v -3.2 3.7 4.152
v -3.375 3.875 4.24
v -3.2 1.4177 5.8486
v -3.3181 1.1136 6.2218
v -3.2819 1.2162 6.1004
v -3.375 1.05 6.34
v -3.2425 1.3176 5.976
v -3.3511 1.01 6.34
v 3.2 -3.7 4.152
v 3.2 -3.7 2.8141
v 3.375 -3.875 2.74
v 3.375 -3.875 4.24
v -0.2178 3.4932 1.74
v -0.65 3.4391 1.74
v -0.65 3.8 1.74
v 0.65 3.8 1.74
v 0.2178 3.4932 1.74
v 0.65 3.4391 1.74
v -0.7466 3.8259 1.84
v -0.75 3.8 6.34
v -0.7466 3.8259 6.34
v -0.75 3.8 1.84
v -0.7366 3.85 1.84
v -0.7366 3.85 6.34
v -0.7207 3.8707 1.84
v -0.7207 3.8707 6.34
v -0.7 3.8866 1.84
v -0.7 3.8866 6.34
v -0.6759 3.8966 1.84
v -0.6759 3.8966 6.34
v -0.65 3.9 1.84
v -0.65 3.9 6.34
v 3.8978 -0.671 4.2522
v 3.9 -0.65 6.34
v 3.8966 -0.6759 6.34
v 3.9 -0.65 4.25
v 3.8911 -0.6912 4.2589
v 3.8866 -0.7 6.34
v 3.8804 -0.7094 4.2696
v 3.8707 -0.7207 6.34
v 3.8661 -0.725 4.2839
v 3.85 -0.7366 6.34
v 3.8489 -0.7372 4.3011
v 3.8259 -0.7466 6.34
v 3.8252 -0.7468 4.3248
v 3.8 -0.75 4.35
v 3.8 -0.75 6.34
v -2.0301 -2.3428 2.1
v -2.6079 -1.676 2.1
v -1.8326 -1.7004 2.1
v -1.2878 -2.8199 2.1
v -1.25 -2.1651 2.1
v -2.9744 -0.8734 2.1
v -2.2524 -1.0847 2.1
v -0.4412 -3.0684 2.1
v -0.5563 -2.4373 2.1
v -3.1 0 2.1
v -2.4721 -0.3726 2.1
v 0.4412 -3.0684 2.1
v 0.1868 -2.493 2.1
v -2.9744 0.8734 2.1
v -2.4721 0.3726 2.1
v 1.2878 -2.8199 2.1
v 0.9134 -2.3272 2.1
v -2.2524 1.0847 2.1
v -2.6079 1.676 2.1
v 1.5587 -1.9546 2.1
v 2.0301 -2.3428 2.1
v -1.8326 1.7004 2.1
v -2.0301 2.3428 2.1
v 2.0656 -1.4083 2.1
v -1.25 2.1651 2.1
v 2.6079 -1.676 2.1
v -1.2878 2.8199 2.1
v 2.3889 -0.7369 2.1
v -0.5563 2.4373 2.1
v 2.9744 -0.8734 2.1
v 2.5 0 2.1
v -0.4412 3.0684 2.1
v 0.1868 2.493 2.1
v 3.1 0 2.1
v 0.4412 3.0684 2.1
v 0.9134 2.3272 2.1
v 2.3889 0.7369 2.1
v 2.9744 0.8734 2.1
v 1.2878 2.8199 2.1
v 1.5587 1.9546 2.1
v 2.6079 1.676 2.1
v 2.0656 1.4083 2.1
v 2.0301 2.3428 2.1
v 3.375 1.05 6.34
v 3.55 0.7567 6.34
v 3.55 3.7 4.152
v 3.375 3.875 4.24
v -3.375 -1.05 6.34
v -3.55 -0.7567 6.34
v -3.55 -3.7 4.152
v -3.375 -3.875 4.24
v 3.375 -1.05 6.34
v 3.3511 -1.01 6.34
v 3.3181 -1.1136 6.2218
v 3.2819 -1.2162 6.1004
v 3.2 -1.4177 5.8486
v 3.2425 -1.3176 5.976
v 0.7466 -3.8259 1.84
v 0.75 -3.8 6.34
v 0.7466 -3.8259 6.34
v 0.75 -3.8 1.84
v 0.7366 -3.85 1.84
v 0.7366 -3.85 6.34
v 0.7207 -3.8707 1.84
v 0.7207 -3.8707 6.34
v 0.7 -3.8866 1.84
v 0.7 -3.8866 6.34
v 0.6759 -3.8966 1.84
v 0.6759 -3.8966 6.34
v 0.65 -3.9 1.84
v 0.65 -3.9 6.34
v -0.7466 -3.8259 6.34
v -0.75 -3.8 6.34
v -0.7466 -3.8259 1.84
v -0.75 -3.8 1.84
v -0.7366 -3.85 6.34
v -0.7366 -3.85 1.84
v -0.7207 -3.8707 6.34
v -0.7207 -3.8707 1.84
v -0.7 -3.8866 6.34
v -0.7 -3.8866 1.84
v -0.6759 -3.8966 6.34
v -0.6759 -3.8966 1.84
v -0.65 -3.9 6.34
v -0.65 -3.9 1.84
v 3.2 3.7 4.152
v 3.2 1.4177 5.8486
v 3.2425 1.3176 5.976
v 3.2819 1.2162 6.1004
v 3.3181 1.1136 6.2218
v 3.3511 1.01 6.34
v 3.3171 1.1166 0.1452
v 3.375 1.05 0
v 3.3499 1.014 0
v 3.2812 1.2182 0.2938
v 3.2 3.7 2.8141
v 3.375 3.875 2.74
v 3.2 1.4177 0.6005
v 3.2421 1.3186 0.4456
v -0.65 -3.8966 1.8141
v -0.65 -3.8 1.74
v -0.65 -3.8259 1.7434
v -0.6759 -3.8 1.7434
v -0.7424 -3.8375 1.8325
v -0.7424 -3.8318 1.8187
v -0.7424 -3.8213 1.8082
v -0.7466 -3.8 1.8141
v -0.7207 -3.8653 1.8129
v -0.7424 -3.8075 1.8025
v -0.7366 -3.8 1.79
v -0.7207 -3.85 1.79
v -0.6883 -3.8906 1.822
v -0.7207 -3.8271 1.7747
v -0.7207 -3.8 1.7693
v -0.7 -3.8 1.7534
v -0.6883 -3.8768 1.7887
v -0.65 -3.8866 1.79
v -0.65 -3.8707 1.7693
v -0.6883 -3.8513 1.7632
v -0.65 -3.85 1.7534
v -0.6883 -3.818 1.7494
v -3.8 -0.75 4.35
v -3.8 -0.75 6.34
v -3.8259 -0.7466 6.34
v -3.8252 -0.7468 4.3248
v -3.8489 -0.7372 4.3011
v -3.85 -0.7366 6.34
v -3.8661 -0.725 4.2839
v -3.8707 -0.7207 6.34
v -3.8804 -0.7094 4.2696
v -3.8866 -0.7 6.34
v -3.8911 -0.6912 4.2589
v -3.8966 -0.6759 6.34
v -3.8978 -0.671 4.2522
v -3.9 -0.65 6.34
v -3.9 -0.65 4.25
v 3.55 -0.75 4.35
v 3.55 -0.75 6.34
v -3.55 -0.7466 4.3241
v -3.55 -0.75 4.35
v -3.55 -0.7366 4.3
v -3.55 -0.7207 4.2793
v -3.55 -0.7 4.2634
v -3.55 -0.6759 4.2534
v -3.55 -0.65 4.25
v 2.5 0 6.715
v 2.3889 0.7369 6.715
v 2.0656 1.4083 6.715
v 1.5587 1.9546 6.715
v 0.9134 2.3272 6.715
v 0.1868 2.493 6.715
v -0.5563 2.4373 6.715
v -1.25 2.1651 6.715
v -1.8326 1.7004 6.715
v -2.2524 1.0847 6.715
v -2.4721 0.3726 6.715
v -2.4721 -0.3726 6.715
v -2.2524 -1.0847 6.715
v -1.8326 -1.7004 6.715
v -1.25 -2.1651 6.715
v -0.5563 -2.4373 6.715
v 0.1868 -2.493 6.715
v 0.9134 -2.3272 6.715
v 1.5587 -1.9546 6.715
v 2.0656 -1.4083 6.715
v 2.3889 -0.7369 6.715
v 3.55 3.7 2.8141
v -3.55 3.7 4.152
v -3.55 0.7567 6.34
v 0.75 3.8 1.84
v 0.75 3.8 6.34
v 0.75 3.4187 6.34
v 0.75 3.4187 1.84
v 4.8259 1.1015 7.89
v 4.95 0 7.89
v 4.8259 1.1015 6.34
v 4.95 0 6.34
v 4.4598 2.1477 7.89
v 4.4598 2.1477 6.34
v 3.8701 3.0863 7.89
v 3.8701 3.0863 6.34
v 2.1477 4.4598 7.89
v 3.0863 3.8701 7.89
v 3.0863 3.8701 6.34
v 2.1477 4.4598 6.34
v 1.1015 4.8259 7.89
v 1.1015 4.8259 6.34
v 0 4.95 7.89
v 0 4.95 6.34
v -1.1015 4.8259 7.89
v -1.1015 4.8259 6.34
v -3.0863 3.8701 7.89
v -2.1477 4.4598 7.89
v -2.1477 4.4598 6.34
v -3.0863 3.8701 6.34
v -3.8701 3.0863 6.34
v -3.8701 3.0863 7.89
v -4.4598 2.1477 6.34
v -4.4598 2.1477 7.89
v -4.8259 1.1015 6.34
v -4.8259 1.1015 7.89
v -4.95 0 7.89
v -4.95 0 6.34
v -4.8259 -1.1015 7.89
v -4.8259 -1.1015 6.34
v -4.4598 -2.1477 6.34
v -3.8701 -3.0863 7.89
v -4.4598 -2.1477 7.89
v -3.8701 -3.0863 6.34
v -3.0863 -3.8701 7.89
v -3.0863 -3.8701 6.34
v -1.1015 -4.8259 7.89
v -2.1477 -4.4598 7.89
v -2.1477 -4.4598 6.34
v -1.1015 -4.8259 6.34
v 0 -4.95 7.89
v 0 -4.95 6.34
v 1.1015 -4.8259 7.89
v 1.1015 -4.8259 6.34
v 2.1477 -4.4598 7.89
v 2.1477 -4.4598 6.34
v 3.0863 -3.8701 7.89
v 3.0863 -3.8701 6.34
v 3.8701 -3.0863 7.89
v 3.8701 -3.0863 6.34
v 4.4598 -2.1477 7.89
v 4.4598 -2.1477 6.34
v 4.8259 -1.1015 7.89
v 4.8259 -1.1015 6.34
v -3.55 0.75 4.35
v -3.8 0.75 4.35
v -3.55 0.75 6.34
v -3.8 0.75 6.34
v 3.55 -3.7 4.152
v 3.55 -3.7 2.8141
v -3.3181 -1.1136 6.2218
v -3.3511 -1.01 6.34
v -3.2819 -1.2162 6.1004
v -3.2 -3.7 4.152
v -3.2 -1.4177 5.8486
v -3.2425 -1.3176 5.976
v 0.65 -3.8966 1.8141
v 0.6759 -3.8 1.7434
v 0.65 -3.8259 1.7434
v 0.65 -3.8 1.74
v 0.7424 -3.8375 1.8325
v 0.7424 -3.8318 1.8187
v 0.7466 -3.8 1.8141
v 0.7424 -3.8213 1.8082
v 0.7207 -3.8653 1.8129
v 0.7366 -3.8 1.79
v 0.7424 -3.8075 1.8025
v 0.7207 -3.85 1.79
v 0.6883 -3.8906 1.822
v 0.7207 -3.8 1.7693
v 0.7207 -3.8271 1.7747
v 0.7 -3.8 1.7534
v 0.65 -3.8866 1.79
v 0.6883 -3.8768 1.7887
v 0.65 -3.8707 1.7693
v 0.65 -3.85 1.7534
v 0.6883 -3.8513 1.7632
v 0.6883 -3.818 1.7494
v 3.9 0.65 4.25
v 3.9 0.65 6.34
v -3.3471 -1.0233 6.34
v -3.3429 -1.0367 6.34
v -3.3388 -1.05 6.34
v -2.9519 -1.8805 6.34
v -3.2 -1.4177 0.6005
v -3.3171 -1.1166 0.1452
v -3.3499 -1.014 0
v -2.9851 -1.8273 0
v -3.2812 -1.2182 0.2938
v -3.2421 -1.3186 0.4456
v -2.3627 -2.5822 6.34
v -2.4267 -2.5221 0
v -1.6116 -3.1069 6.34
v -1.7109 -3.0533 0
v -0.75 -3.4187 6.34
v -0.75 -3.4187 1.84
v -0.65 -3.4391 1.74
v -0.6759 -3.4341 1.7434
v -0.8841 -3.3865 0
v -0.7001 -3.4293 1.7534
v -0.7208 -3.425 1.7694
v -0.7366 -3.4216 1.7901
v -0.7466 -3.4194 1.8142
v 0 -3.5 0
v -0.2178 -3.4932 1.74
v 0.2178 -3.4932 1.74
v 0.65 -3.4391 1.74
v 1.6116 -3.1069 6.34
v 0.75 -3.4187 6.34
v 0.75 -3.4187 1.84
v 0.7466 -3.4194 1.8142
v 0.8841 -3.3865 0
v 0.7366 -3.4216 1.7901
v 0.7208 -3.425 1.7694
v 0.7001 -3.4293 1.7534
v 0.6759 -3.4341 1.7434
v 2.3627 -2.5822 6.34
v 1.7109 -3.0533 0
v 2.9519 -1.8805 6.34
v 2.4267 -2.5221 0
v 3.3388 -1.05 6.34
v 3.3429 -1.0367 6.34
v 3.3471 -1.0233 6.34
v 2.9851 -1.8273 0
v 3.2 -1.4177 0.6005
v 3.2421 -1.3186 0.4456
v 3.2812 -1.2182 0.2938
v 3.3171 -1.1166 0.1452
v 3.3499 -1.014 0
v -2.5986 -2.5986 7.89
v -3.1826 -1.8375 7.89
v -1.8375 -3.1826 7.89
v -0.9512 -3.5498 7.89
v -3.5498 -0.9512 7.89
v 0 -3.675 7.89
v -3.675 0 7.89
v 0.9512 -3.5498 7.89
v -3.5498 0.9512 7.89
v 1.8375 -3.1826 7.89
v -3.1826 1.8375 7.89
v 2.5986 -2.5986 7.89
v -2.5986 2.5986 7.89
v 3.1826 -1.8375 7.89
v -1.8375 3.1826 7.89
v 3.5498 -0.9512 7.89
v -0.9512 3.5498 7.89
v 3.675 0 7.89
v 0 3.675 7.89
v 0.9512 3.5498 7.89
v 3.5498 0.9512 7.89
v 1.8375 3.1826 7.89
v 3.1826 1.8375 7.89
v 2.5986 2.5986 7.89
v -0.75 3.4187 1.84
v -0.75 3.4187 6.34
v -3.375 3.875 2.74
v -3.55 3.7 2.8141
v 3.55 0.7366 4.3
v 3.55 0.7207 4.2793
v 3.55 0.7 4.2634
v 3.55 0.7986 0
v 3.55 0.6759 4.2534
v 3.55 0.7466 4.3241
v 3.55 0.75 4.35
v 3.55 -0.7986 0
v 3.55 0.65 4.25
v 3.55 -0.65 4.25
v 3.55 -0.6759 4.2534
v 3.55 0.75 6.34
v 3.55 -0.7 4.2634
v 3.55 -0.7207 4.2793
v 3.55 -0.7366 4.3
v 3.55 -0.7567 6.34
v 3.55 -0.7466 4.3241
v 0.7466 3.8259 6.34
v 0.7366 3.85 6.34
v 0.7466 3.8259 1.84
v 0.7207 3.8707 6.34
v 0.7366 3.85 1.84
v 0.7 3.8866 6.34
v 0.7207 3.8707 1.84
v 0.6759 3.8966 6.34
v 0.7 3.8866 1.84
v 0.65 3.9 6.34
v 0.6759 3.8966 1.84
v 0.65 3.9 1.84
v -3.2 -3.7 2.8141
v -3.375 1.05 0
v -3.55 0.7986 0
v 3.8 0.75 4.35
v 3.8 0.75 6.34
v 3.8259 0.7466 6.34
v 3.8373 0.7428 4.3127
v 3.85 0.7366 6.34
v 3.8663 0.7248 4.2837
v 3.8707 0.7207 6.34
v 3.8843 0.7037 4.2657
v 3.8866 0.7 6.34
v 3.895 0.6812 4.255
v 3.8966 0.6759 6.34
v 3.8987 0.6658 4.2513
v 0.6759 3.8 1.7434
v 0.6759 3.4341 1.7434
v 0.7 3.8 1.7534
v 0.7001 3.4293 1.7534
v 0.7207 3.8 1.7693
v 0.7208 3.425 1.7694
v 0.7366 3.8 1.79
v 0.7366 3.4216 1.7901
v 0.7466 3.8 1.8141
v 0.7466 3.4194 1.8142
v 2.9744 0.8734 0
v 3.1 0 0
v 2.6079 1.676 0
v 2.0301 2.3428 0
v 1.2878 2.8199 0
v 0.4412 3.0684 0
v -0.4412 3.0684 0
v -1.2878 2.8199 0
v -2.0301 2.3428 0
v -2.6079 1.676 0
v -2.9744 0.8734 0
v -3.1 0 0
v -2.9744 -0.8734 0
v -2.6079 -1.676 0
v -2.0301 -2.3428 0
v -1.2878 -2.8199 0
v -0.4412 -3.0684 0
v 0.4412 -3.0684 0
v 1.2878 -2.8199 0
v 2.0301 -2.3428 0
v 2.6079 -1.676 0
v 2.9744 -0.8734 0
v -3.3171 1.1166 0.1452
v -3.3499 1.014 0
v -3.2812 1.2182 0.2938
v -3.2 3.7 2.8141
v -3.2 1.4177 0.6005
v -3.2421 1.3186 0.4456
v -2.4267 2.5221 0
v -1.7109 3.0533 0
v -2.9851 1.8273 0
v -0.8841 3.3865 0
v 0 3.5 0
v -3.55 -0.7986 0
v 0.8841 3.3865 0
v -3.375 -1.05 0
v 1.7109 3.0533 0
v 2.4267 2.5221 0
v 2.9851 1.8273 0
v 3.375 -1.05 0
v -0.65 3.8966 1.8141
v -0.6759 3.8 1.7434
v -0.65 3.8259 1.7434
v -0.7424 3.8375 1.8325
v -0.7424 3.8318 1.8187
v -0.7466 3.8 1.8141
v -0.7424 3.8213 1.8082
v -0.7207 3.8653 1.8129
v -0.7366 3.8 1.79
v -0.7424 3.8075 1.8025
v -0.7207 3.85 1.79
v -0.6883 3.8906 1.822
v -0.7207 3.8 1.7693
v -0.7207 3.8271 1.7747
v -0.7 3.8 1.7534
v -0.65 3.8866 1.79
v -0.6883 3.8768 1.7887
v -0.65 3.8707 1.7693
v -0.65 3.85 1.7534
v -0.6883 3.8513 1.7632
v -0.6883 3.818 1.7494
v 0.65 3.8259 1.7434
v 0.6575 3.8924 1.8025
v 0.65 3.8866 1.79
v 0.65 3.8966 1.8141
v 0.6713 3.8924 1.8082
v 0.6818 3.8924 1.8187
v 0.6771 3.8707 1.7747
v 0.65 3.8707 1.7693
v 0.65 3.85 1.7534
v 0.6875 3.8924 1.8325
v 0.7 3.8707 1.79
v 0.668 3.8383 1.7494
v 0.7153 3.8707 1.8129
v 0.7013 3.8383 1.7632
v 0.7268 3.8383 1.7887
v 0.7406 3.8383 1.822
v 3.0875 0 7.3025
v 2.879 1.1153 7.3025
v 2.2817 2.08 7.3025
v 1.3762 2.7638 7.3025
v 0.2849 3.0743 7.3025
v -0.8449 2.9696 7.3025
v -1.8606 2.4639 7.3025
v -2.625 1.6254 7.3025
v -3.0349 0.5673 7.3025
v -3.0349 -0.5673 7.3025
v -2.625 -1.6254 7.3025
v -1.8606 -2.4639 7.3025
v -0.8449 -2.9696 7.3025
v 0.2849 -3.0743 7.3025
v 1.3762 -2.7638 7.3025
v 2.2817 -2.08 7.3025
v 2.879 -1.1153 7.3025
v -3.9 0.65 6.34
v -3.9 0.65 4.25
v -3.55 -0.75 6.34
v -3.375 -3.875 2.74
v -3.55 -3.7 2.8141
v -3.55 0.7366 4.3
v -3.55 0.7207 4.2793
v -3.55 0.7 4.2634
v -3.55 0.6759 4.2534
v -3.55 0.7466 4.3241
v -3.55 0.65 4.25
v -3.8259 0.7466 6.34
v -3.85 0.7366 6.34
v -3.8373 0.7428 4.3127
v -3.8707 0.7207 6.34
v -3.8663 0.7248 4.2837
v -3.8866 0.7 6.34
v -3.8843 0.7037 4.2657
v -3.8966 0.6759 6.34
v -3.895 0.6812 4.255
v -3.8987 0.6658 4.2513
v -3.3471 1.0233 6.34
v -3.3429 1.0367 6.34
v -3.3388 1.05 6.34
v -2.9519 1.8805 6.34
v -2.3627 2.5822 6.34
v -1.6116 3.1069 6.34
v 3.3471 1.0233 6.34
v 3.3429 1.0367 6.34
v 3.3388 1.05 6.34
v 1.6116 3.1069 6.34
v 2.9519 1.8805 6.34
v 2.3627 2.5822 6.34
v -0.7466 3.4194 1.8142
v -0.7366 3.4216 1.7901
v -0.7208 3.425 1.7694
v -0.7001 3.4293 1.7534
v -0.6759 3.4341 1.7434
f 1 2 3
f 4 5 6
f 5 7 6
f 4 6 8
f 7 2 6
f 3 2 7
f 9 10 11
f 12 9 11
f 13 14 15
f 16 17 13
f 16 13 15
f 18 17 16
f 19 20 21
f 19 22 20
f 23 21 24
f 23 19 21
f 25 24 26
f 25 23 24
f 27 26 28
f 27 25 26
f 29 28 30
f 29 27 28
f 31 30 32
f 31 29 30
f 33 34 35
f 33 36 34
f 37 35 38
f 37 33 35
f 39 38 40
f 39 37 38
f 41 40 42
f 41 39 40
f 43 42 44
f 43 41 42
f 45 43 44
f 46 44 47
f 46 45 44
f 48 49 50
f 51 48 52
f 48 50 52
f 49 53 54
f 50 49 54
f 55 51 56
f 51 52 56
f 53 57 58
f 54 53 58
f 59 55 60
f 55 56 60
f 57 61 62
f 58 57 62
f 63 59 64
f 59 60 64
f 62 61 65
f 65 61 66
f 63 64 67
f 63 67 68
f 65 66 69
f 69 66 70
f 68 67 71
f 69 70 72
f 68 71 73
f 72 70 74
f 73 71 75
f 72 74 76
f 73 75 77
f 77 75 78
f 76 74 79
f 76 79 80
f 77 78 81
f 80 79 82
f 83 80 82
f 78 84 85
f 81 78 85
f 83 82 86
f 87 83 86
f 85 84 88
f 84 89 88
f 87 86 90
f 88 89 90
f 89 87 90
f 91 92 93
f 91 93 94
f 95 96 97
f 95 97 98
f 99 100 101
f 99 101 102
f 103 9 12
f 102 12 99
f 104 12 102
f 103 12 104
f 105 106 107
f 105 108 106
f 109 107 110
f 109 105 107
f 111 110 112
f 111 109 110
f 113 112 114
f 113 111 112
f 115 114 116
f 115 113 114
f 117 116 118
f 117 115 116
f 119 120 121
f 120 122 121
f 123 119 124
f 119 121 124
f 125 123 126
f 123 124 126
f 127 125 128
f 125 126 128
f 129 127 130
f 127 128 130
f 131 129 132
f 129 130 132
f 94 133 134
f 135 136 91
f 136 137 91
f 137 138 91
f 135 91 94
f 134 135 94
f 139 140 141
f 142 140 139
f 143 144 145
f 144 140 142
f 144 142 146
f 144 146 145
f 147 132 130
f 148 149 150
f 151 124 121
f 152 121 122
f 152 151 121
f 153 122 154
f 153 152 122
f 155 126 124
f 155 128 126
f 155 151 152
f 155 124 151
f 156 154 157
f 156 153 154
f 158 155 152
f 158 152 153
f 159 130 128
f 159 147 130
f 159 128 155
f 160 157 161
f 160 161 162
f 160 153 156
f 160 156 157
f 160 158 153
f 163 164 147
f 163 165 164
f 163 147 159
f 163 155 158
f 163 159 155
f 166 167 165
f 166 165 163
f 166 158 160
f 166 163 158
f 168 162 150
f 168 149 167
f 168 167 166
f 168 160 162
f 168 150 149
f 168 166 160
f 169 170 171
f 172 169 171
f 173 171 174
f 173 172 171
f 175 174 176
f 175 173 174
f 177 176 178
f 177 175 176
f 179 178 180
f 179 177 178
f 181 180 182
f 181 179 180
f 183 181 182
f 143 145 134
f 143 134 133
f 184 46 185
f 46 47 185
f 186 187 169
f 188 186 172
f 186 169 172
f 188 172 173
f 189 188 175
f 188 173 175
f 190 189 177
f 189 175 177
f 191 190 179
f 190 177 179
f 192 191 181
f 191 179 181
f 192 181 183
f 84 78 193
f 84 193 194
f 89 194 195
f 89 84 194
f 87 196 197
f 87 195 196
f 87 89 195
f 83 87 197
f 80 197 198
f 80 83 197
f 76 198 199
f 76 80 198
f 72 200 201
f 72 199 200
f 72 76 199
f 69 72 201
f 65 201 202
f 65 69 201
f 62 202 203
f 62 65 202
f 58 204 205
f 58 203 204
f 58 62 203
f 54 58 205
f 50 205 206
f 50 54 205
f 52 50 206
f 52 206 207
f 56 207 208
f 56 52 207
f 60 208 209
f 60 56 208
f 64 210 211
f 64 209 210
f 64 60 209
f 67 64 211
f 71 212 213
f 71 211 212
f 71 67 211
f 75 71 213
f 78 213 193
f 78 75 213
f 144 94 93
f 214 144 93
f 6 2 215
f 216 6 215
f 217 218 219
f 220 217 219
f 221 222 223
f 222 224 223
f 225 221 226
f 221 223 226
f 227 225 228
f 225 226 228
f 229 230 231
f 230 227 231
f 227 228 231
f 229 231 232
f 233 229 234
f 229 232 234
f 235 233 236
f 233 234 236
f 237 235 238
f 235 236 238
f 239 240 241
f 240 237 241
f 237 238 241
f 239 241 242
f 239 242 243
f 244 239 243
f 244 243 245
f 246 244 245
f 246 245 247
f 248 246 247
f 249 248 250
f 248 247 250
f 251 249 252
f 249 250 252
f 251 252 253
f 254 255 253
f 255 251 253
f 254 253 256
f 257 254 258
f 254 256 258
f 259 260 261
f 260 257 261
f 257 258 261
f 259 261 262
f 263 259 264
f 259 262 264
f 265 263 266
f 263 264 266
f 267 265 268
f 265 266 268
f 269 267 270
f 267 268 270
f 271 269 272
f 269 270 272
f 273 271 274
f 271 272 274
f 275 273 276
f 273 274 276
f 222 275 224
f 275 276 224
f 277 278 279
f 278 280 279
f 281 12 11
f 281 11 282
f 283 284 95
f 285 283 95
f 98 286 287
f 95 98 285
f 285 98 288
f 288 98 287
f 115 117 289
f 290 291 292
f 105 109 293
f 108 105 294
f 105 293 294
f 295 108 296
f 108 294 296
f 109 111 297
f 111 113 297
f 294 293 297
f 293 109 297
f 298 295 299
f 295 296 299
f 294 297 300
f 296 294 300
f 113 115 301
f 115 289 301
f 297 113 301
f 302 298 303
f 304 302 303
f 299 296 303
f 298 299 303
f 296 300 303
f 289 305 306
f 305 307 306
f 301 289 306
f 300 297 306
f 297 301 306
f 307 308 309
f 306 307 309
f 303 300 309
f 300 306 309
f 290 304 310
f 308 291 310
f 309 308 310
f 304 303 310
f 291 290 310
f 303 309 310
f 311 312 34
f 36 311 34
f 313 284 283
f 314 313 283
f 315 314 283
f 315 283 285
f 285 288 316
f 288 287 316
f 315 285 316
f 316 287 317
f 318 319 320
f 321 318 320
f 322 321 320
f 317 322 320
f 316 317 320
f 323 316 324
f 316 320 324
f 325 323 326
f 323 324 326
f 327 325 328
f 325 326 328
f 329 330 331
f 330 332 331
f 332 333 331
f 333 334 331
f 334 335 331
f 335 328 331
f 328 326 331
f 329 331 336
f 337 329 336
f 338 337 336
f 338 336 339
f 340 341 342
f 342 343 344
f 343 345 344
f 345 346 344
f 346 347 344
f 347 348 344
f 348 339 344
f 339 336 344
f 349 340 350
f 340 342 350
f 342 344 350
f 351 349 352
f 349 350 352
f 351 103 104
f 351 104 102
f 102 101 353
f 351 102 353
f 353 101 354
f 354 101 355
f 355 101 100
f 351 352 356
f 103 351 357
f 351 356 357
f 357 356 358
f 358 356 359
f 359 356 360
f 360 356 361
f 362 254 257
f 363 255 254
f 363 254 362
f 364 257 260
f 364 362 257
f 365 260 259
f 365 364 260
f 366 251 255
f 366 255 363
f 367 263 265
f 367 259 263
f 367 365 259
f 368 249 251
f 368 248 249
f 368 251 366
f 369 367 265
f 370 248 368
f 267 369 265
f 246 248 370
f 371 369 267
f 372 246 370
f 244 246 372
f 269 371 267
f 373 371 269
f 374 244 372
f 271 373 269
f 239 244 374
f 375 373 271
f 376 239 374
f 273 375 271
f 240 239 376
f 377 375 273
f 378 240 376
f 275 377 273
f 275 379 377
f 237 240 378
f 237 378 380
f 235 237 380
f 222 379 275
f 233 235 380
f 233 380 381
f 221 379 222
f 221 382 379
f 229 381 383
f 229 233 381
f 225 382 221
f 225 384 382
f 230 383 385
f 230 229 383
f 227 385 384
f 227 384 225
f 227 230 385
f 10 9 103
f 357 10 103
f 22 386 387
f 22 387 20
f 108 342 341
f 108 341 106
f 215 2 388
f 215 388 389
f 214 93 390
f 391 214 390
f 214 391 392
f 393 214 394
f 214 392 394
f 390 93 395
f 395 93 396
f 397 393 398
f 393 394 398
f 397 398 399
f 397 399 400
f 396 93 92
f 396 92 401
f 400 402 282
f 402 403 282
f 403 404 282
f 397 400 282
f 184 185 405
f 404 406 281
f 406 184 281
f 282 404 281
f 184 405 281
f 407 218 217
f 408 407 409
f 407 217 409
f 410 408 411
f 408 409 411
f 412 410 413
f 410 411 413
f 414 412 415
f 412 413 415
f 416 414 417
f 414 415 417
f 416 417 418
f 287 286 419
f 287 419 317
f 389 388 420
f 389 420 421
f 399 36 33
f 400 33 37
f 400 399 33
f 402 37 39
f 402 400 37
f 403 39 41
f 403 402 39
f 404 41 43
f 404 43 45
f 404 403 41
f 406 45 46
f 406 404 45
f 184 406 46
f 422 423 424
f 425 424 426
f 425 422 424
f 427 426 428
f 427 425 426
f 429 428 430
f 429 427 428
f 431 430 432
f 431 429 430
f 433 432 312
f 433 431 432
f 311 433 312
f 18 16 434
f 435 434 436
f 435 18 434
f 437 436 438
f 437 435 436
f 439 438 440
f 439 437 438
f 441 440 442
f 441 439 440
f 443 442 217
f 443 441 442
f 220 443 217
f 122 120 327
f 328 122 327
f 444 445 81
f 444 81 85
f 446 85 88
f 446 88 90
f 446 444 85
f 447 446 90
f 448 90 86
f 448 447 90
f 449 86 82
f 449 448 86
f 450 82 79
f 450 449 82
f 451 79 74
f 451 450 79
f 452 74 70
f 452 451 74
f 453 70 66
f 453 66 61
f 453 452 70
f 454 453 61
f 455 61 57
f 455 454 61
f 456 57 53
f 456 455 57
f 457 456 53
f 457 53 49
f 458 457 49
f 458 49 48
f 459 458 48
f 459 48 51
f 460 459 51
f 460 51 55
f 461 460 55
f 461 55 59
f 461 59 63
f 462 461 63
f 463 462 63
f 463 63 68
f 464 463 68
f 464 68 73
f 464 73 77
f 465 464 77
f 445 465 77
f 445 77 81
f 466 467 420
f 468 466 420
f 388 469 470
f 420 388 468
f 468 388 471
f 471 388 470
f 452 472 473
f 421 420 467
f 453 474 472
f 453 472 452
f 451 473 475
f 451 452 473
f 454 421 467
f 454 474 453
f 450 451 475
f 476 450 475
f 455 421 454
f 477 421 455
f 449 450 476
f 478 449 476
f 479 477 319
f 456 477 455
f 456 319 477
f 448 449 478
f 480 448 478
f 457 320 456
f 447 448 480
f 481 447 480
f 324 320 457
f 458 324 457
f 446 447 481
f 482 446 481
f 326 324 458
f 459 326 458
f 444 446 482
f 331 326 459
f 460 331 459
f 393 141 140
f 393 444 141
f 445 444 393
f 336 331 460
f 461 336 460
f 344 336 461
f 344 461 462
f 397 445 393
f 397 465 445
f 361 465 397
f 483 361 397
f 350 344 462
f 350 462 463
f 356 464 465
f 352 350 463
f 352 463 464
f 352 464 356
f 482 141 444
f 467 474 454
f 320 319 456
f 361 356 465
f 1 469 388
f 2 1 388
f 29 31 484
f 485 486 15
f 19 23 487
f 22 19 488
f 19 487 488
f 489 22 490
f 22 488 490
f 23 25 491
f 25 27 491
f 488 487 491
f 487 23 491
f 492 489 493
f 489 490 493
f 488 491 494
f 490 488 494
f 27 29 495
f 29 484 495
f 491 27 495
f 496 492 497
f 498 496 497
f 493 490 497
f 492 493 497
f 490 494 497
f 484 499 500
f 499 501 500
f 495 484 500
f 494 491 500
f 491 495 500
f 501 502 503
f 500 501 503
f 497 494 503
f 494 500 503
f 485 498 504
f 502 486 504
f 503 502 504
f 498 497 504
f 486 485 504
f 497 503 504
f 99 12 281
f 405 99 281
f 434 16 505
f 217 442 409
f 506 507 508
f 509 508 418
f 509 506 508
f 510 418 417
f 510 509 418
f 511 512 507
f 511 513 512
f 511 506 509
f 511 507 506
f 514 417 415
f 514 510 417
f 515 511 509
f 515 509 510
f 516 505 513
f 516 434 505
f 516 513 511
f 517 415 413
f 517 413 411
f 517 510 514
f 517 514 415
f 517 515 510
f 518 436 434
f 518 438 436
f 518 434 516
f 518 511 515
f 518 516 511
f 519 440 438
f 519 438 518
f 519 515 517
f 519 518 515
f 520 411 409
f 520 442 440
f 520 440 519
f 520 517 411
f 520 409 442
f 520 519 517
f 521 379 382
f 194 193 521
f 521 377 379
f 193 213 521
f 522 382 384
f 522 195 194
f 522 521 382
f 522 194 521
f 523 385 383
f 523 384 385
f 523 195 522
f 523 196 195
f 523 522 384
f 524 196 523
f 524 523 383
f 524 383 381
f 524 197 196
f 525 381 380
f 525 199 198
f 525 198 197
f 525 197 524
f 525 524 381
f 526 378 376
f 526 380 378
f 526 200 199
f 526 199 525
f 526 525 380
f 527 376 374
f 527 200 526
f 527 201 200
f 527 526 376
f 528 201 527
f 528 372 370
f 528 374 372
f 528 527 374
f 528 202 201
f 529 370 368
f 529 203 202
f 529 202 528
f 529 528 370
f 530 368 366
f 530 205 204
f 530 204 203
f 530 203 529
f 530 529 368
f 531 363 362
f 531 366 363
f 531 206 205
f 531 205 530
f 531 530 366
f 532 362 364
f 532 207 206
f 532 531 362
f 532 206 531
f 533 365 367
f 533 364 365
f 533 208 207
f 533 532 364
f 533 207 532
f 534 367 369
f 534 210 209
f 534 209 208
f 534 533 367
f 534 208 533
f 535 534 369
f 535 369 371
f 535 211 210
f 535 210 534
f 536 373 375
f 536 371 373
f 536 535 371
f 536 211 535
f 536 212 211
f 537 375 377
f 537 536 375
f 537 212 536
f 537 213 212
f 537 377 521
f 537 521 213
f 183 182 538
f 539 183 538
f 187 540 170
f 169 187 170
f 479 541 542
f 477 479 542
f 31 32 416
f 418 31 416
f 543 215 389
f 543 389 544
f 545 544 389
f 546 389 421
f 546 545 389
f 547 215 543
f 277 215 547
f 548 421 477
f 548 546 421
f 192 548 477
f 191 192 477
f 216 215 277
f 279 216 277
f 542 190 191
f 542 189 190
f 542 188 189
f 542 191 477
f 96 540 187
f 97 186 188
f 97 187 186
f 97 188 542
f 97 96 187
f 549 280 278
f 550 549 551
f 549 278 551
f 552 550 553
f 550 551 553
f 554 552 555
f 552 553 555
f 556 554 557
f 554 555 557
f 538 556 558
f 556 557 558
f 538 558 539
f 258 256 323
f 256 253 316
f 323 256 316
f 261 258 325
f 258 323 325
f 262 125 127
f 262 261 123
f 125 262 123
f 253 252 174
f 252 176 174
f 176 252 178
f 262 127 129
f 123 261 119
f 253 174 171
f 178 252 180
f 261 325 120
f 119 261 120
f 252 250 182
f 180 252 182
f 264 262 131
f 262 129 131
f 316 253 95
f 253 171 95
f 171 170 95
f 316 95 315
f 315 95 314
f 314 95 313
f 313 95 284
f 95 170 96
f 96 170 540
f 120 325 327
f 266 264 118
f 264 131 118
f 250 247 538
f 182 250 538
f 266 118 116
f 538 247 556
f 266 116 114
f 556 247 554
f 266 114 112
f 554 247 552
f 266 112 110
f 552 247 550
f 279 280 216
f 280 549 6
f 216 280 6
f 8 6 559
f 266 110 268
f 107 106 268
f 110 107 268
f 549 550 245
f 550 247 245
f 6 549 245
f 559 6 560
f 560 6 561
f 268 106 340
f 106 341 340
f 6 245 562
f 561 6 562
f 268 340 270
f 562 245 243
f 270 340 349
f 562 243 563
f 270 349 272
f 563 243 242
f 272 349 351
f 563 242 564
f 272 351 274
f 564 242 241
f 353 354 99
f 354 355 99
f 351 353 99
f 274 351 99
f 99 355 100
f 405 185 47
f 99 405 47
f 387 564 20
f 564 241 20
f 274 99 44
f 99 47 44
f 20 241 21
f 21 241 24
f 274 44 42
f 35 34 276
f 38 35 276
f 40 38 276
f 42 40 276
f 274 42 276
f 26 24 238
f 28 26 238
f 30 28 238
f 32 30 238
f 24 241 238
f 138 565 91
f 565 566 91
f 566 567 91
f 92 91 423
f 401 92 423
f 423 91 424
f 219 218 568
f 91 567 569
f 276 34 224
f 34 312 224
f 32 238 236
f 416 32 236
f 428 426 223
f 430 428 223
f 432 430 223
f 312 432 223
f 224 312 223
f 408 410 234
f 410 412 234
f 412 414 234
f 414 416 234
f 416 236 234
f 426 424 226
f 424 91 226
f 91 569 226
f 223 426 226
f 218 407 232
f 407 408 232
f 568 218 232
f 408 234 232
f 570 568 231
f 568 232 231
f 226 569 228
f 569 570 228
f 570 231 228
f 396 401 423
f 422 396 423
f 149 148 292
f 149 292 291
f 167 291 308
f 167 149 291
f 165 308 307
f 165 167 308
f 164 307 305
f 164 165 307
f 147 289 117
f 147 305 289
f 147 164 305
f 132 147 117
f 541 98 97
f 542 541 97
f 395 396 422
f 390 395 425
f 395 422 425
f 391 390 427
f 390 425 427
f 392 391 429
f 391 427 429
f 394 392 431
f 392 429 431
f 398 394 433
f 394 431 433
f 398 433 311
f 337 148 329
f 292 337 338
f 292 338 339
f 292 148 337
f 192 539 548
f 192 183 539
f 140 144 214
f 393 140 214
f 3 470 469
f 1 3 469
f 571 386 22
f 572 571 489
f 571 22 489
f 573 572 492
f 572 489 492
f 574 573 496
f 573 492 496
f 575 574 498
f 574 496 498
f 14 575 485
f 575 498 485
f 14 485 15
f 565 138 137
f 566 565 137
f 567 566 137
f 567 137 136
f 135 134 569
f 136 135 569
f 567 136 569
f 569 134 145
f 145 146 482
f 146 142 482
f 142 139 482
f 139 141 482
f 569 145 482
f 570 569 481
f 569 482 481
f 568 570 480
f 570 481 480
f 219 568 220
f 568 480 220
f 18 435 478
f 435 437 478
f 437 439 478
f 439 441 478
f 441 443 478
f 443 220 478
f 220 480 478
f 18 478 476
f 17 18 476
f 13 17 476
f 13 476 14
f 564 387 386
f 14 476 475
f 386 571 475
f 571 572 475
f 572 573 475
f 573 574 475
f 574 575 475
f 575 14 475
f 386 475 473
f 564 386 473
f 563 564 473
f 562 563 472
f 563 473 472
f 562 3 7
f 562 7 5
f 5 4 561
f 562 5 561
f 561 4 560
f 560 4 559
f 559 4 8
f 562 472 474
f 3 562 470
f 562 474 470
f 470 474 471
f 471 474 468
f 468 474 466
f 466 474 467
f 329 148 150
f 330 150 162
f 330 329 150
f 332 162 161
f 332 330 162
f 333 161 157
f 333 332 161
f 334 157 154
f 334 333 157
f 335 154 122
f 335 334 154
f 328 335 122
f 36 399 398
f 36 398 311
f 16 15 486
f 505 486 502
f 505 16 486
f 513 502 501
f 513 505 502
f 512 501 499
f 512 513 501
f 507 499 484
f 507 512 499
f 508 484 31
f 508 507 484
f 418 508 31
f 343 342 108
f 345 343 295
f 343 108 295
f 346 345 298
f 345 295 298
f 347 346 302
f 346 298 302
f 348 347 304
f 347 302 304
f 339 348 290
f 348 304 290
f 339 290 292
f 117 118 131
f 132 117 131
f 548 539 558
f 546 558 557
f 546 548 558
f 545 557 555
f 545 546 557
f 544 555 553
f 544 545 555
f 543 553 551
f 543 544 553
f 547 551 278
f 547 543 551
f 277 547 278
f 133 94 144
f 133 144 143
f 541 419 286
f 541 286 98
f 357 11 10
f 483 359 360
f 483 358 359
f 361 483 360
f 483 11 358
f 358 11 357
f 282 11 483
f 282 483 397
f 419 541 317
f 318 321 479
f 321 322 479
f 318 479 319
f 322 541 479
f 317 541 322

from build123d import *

# Parameters (mm, degrees)
F0_R          = 3.5
F0_R_2        = 3.1
F1_DEPTH      = 2.1
F2_R          = 3.5
F2_R_2        = 3.1
F2_R_3        = 2.5
F3_DEPTH      = 4.24
F4_R          = 4.95
F4_R_2        = 3.5
F4_R_3        = 2.5
F5_DEPTH      = 1.55
F6_SIZE       = 1.175
F8_DEPTH      = 4.6
F9_DEPTH      = 2.09
F10_R         = 0.1
F11_W         = 0.35
F11_H         = 3.875
F12_DEPTH     = 6.34
F14_DEPTH     = 0.38076
F16_T1_DEPTH  = 4.8355972722
F16_T3_DEPTH  = 2.4000890458
F16_T5_DEPTH  = 4.8355972722
F16_T10_DEPTH = 4.4201210059
F16_T15_DEPTH = 4.638323219
F16_S16_R     = 3.5
F16_T17_DEPTH = 4
F16_T21_DEPTH = 4.2769316216
F16_S23_R     = 3.5
F16_T24_DEPTH = 4
F16_T28_DEPTH = 4.638323219
F16_S29_R     = 3.5
F16_T30_DEPTH = 4
F16_T34_DEPTH = 4.4201210059
F16_T39_DEPTH = 4.2769316216
F16_S41_R     = 3.5
F16_T42_DEPTH = 4
F16_T46_DEPTH = 4.2769316216
F16_S48_R     = 3.5
F16_T49_DEPTH = 4
F16_T53_DEPTH = 4.4201210059
F16_T58_DEPTH = 4.638323219
F16_S59_R     = 3.5
F16_T60_DEPTH = 4
F16_T64_DEPTH = 4.4201210059
F16_T69_DEPTH = 4.2769316216
F16_S71_R     = 3.5
F16_T72_DEPTH = 4
F16_T76_DEPTH = 4.638323219
F16_S77_R     = 3.5
F16_T78_DEPTH = 4


# Not quite as in the source:
# - a fillet or chamfer that OpenCascade refuses, or shapes differently, is made with other operations: its cross-section is extruded or revolved along the edge and cut away or added


with BuildPart() as f1:
    # F0 (on Top) → F1 (new body)
    with BuildSketch(Plane.XY):
        Circle(F0_R)
        Circle(F0_R_2, mode=Mode.SUBTRACT)
    extrude(amount=F1_DEPTH)

    # F2 (on face) → F3 (join)
    with BuildSketch(Plane.XY.offset(2.1)):
        Circle(F2_R)
        Circle(F2_R_2, mode=Mode.SUBTRACT)
        Circle(F2_R_2)
        Circle(F2_R_3, mode=Mode.SUBTRACT)
    extrude(amount=F3_DEPTH)

    # F4 (on face) → F5 (join)
    with BuildSketch(Plane.XY.offset(6.34)):
        Circle(F4_R)
        Circle(F4_R_2, mode=Mode.SUBTRACT)
        Circle(F4_R_2)
        Circle(F4_R_3, mode=Mode.SUBTRACT)
    extrude(amount=F5_DEPTH)

    # F6
    f6_edges = [f1.edges().sort_by_distance(p)[0] for p in [
        (-2.5, 0, 7.89),
    ]]
    chamfer(f6_edges, length=F6_SIZE)

    # F7 (on face) → F8 (join)
    with BuildSketch(Plane(origin=(0, 0, 6.34), x_dir=(1, 0, 0), z_dir=(0, 0, -1))):
        with BuildLine():
            Line((-0.75, -3.9), (0, -3.9))
            Line((0, -3.9), (0.75, -3.9))
            Line((0.75, -3.9), (0.75, -3.4186985828))
            ThreePointArc((0.75, -3.4186985828), (0, -3.5), (-0.75, -3.4186985828))
            Line((-0.75, -3.4186985828), (-0.75, -3.9))
        make_face()
        with BuildLine():
            Line((-0.75, 3.9), (-0.75, 3.4186985828))
            ThreePointArc((-0.75, 3.4186985828), (0, 3.5), (0.75, 3.4186985828))
            Line((0.75, 3.4186985828), (0.75, 3.9))
            Line((0.75, 3.9), (0, 3.9))
            Line((0, 3.9), (-0.75, 3.9))
        make_face()
    extrude(amount=F8_DEPTH)

    # F7 (on face) → F9 (join)
    with BuildSketch(Plane(origin=(0, 0, 6.34), x_dir=(1, 0, 0), z_dir=(0, 0, -1))):
        with BuildLine():
            Line((-3.9, -0.75), (-3.4186985828, -0.75))
            ThreePointArc((-3.4186985828, -0.75), (-3.5, 0), (-3.4186985828, 0.75))
            Line((-3.4186985828, 0.75), (-3.9, 0.75))
            Line((-3.9, 0.75), (-3.9, 0))
            Line((-3.9, 0), (-3.9, -0.75))
        make_face()
        with BuildLine():
            ThreePointArc((3.5, 0), (3.4796152833, -0.3771968718), (3.4186985828, -0.75))
            Line((3.4186985828, -0.75), (3.9, -0.75))
            Line((3.9, -0.75), (3.9, 0))
            Line((3.9, 0), (3.9, 0.75))
            Line((3.9, 0.75), (3.4186985828, 0.75))
            ThreePointArc((3.4186985828, 0.75), (3.4796152833, 0.3771968718), (3.5, 0))
        make_face()
    extrude(amount=F9_DEPTH)

    # F10
    f10_edges = [f1.edges().sort_by_distance(p)[0] for p in [
        (0.75, 3.659349, 1.74),
        (0, 3.9, 1.74),
        (0.75, 3.9, 4.04),
        (3.659349, 0.75, 4.25),
        (3.9, 0.75, 5.295),
        (3.659349, -0.75, 4.25),
        (3.9, -0.75, 5.295),
        (0, -3.9, 1.74),
        (0.75, -3.9, 4.04),
        (0.75, -3.659349, 1.74),
        (-0.75, -3.9, 4.04),
        (-0.75, -3.659349, 1.74),
        (-3.9, -0.75, 5.295),
        (-3.9, 0, 4.25),
        (-3.9, 0.75, 5.295),
        (-3.659349, 0.75, 4.25),
        (-3.659349, -0.75, 4.25),
        (-0.75, 3.9, 4.04),
        (-0.75, 3.659349, 1.74),
    ]]
    fillet(f10_edges, radius=F10_R)

    # F11 (on face) → F12 (join)
    with BuildSketch(Plane(origin=(0, 0, 6.34), x_dir=(1, 0, 0), z_dir=(0, 0, -1))):
        with Locations((3.375, 1.9375)):
            Rectangle(F11_W, F11_H)
        with Locations((3.375, -1.9375)):
            Rectangle(F11_W, F11_H)
    extrude(amount=F12_DEPTH)

    # F13 (on face) → F14 (cut)
    with BuildSketch(Plane.YZ.offset(3.55)):
        Polygon((-3.875, 6.34), (-3.875, 4.24), (-1.05, 6.34), (-3.4496376621, 6.34), align=None)
        Polygon((1.05, 6.34), (3.875, 4.24), (3.875, 6.34), (3.4496376621, 6.34), align=None)
        Polygon((3.875, 2.74), (1.05, 0), (3.875, 0), align=None)
        Polygon((-1.05, 0), (-3.875, 2.74), (-3.875, 0), align=None)
    extrude(amount=-F14_DEPTH, mode=Mode.SUBTRACT)

    # F15: F1 across plane


with BuildPart() as f1_1:
    add(f1.part)
    add(f1.part.mirror(Plane.YZ))

    # F16: chamfer of 0.175 on 24 edges, made by hand

    # F16_s2 → F16_t1 (cut)
    with BuildSketch(Plane(origin=(0, 3.6890864967, 3.5780874339), x_dir=(1, 0, 0), z_dir=(0, -0.7178234265, -0.6962251995))):
        Polygon((-3.375, -0.7310364595), (-3.55, -0.5560364595), (-3.55, -0.7310364595), align=None)
        Polygon((3.375, -0.7310364595), (3.55, -0.5560364595), (3.55, -0.7310364595), align=None)
    extrude(amount=F16_T1_DEPTH, mode=Mode.SUBTRACT)

    # F16_s4 → F16_t3 (cut)
    with BuildSketch(Plane.XY.offset(2.2899554771)):
        Polygon((-3.375, 3.875), (-3.55, 3.7), (-3.55, 3.875), align=None)
        Polygon((-3.2, 3.7), (-3.375, 3.875), (-3.2, 3.875), align=None)
        Polygon((-3.375, -3.875), (-3.55, -3.7), (-3.55, -3.875), align=None)
        Polygon((-3.2, -3.7), (-3.375, -3.875), (-3.2, -3.875), align=None)
        Polygon((3.2, -3.7), (3.375, -3.875), (3.2, -3.875), align=None)
        Polygon((3.375, -3.875), (3.55, -3.7), (3.55, -3.875), align=None)
        Polygon((3.375, 3.875), (3.55, 3.7), (3.55, 3.875), align=None)
        Polygon((3.375, 3.875), (3.2, 3.7), (3.2, 3.875), align=None)
    extrude(amount=F16_T3_DEPTH, mode=Mode.SUBTRACT)

    # F16_s6 → F16_t5 (cut)
    with BuildSketch(Plane(origin=(0, -0.2179814937, 0.2114227585), x_dir=(1, 0, 0), z_dir=(0, -0.7178234265, 0.6962251995))):
        Polygon((-3.375, -0.7310364595), (-3.55, -0.5560364595), (-3.55, -0.7310364595), align=None)
        Polygon((3.375, -0.7310364595), (3.55, -0.5560364595), (3.55, -0.7310364595), align=None)
    extrude(amount=F16_T5_DEPTH, mode=Mode.SUBTRACT)


with BuildPart() as f16_tool8:
    # F16_s9 → F16_t10 (new body)
    with BuildSketch(Plane(origin=(0, -2.7204178255, 2.0222574986), x_dir=(1, 0, 0), z_dir=(0, 0.8025495314, -0.5965854924))):
        Polygon((-3.375, -5.7145787959), (-3.55, -5.5395787959), (-3.55, -5.7145787959), align=None)
    extrude(amount=F16_T10_DEPTH)

    split(bisect_by=Plane.XY.offset(6.34), keep=Keep.BOTTOM)


with BuildPart() as f1_2:
    add(f1_1.part)

    # F16_t7: cut F16_tool8
    add(f16_tool8.part, mode=Mode.SUBTRACT)


with BuildPart() as f16_tool13:
    # F16_s14 → F16_t15 (new body)
    with BuildSketch(Plane(origin=(0, 3.6890864967, 3.5780874339), x_dir=(1, 0, 0), z_dir=(0, -0.7178234265, -0.6962251995))):
        Polygon((-3.2, -0.5560364595), (-3.375, -0.7310364595), (-3.2, -0.7310364595), align=None)
    extrude(amount=F16_T15_DEPTH)

    # F16_s16 → F16_t17 (cut, symmetric)
    with BuildSketch(Plane.XY.offset(1.5)):
        Circle(F16_S16_R)
    extrude(amount=F16_T17_DEPTH, both=True, mode=Mode.SUBTRACT)


with BuildPart() as f1_3:
    add(f1_2.part)

    # F16_t12: cut F16_tool13
    add(f16_tool13.part, mode=Mode.SUBTRACT)


with BuildPart() as f16_tool19:
    # F16_s20 → F16_t21 (new body)
    with BuildSketch(Plane(origin=(0, -2.6055012523, 1.9368327893), x_dir=(1, 0, 0), z_dir=(0, 0.8025495314, -0.5965854924))):
        Polygon((-3.375, -5.7145787959), (-3.2, -5.5395787959), (-3.2, -5.7145787959), align=None)
    extrude(amount=F16_T21_DEPTH)

    split(bisect_by=Plane.XY.offset(6.34), keep=Keep.BOTTOM)

    # F16_s23 → F16_t24 (cut, symmetric)
    with BuildSketch(Plane.XY.offset(5.2)):
        Circle(F16_S23_R)
    extrude(amount=F16_T24_DEPTH, both=True, mode=Mode.SUBTRACT)


with BuildPart() as f1_4:
    add(f1_3.part)

    # F16_t18: cut F16_tool19
    add(f16_tool19.part, mode=Mode.SUBTRACT)


with BuildPart() as f16_tool26:
    # F16_s27 → F16_t28 (new body)
    with BuildSketch(Plane(origin=(0, -0.3595894305, 0.3487699255), x_dir=(1, 0, 0), z_dir=(0, -0.7178234265, 0.6962251995))):
        Polygon((-3.375, -0.7310364595), (-3.2, -0.5560364595), (-3.2, -0.7310364595), align=None)
    extrude(amount=F16_T28_DEPTH)

    # F16_s29 → F16_t30 (cut, symmetric)
    with BuildSketch(Plane.XY.offset(1.5)):
        Circle(F16_S29_R)
    extrude(amount=F16_T30_DEPTH, both=True, mode=Mode.SUBTRACT)


with BuildPart() as f1_5:
    add(f1_4.part)

    # F16_t25: cut F16_tool26
    add(f16_tool26.part, mode=Mode.SUBTRACT)


with BuildPart() as f16_tool32:
    # F16_s33 → F16_t34 (new body)
    with BuildSketch(Plane(origin=(0, -0.8269482164, -0.6147225679), x_dir=(1, 0, 0), z_dir=(0, 0.8025495314, 0.5965854924))):
        Polygon((-3.55, -5.5395787959), (-3.375, -5.7145787959), (-3.55, -5.7145787959), align=None)
    extrude(amount=F16_T34_DEPTH)

    split(bisect_by=Plane.XY.offset(6.34), keep=Keep.BOTTOM)


with BuildPart() as f1_6:
    add(f1_5.part)

    # F16_t31: cut F16_tool32
    add(f16_tool32.part, mode=Mode.SUBTRACT)


with BuildPart() as f16_tool37:
    # F16_s38 → F16_t39 (new body)
    with BuildSketch(Plane(origin=(0, -0.8269482164, -0.6147225679), x_dir=(1, 0, 0), z_dir=(0, 0.8025495314, 0.5965854924))):
        Polygon((-3.2, -5.5395787959), (-3.375, -5.7145787959), (-3.2, -5.7145787959), align=None)
    extrude(amount=F16_T39_DEPTH)

    split(bisect_by=Plane.XY.offset(6.34), keep=Keep.BOTTOM)

    # F16_s41 → F16_t42 (cut, symmetric)
    with BuildSketch(Plane.XY.offset(5.2)):
        Circle(F16_S41_R)
    extrude(amount=F16_T42_DEPTH, both=True, mode=Mode.SUBTRACT)


with BuildPart() as f1_7:
    add(f1_6.part)

    # F16_t36: cut F16_tool37
    add(f16_tool37.part, mode=Mode.SUBTRACT)


with BuildPart() as f16_tool44:
    # F16_s45 → F16_t46 (new body)
    with BuildSketch(Plane(origin=(0, -0.8269482164, -0.6147225679), x_dir=(1, 0, 0), z_dir=(0, 0.8025495314, 0.5965854924))):
        Polygon((3.2, -5.5395787959), (3.375, -5.7145787959), (3.2, -5.7145787959), align=None)
    extrude(amount=F16_T46_DEPTH)

    split(bisect_by=Plane.XY.offset(6.34), keep=Keep.BOTTOM)

    # F16_s48 → F16_t49 (cut, symmetric)
    with BuildSketch(Plane.XY.offset(5.2)):
        Circle(F16_S48_R)
    extrude(amount=F16_T49_DEPTH, both=True, mode=Mode.SUBTRACT)


with BuildPart() as f1_8:
    add(f1_7.part)

    # F16_t43: cut F16_tool44
    add(f16_tool44.part, mode=Mode.SUBTRACT)


with BuildPart() as f16_tool51:
    # F16_s52 → F16_t53 (new body)
    with BuildSketch(Plane(origin=(0, -0.8269482164, -0.6147225679), x_dir=(1, 0, 0), z_dir=(0, 0.8025495314, 0.5965854924))):
        Polygon((3.375, -5.7145787959), (3.55, -5.5395787959), (3.55, -5.7145787959), align=None)
    extrude(amount=F16_T53_DEPTH)

    split(bisect_by=Plane.XY.offset(6.34), keep=Keep.BOTTOM)


with BuildPart() as f1_9:
    add(f1_8.part)

    # F16_t50: cut F16_tool51
    add(f16_tool51.part, mode=Mode.SUBTRACT)


with BuildPart() as f16_tool56:
    # F16_s57 → F16_t58 (new body)
    with BuildSketch(Plane(origin=(0, -0.3595894305, 0.3487699255), x_dir=(1, 0, 0), z_dir=(0, -0.7178234265, 0.6962251995))):
        Polygon((3.375, -0.7310364595), (3.2, -0.5560364595), (3.2, -0.7310364595), align=None)
    extrude(amount=F16_T58_DEPTH)

    # F16_s59 → F16_t60 (cut, symmetric)
    with BuildSketch(Plane.XY.offset(1.5)):
        Circle(F16_S59_R)
    extrude(amount=F16_T60_DEPTH, both=True, mode=Mode.SUBTRACT)


with BuildPart() as f1_10:
    add(f1_9.part)

    # F16_t55: cut F16_tool56
    add(f16_tool56.part, mode=Mode.SUBTRACT)


with BuildPart() as f16_tool62:
    # F16_s63 → F16_t64 (new body)
    with BuildSketch(Plane(origin=(0, -2.7204178255, 2.0222574986), x_dir=(1, 0, 0), z_dir=(0, 0.8025495314, -0.5965854924))):
        Polygon((3.55, -5.5395787959), (3.375, -5.7145787959), (3.55, -5.7145787959), align=None)
    extrude(amount=F16_T64_DEPTH)

    split(bisect_by=Plane.XY.offset(6.34), keep=Keep.BOTTOM)


with BuildPart() as f1_11:
    add(f1_10.part)

    # F16_t61: cut F16_tool62
    add(f16_tool62.part, mode=Mode.SUBTRACT)


with BuildPart() as f16_tool67:
    # F16_s68 → F16_t69 (new body)
    with BuildSketch(Plane(origin=(0, -2.6055012523, 1.9368327893), x_dir=(1, 0, 0), z_dir=(0, 0.8025495314, -0.5965854924))):
        Polygon((3.2, -5.5395787959), (3.375, -5.7145787959), (3.2, -5.7145787959), align=None)
    extrude(amount=F16_T69_DEPTH)

    split(bisect_by=Plane.XY.offset(6.34), keep=Keep.BOTTOM)

    # F16_s71 → F16_t72 (cut, symmetric)
    with BuildSketch(Plane.XY.offset(5.2)):
        Circle(F16_S71_R)
    extrude(amount=F16_T72_DEPTH, both=True, mode=Mode.SUBTRACT)


with BuildPart() as f1_12:
    add(f1_11.part)

    # F16_t66: cut F16_tool67
    add(f16_tool67.part, mode=Mode.SUBTRACT)


with BuildPart() as f16_tool74:
    # F16_s75 → F16_t76 (new body)
    with BuildSketch(Plane(origin=(0, 3.6890864967, 3.5780874339), x_dir=(1, 0, 0), z_dir=(0, -0.7178234265, -0.6962251995))):
        Polygon((3.375, -0.7310364595), (3.2, -0.5560364595), (3.2, -0.7310364595), align=None)
    extrude(amount=F16_T76_DEPTH)

    # F16_s77 → F16_t78 (cut, symmetric)
    with BuildSketch(Plane.XY.offset(1.5)):
        Circle(F16_S77_R)
    extrude(amount=F16_T78_DEPTH, both=True, mode=Mode.SUBTRACT)


with BuildPart() as f1_13:
    add(f1_12.part)

    # F16_t73: cut F16_tool74
    add(f16_tool74.part, mode=Mode.SUBTRACT)


solid = f1_13.part
